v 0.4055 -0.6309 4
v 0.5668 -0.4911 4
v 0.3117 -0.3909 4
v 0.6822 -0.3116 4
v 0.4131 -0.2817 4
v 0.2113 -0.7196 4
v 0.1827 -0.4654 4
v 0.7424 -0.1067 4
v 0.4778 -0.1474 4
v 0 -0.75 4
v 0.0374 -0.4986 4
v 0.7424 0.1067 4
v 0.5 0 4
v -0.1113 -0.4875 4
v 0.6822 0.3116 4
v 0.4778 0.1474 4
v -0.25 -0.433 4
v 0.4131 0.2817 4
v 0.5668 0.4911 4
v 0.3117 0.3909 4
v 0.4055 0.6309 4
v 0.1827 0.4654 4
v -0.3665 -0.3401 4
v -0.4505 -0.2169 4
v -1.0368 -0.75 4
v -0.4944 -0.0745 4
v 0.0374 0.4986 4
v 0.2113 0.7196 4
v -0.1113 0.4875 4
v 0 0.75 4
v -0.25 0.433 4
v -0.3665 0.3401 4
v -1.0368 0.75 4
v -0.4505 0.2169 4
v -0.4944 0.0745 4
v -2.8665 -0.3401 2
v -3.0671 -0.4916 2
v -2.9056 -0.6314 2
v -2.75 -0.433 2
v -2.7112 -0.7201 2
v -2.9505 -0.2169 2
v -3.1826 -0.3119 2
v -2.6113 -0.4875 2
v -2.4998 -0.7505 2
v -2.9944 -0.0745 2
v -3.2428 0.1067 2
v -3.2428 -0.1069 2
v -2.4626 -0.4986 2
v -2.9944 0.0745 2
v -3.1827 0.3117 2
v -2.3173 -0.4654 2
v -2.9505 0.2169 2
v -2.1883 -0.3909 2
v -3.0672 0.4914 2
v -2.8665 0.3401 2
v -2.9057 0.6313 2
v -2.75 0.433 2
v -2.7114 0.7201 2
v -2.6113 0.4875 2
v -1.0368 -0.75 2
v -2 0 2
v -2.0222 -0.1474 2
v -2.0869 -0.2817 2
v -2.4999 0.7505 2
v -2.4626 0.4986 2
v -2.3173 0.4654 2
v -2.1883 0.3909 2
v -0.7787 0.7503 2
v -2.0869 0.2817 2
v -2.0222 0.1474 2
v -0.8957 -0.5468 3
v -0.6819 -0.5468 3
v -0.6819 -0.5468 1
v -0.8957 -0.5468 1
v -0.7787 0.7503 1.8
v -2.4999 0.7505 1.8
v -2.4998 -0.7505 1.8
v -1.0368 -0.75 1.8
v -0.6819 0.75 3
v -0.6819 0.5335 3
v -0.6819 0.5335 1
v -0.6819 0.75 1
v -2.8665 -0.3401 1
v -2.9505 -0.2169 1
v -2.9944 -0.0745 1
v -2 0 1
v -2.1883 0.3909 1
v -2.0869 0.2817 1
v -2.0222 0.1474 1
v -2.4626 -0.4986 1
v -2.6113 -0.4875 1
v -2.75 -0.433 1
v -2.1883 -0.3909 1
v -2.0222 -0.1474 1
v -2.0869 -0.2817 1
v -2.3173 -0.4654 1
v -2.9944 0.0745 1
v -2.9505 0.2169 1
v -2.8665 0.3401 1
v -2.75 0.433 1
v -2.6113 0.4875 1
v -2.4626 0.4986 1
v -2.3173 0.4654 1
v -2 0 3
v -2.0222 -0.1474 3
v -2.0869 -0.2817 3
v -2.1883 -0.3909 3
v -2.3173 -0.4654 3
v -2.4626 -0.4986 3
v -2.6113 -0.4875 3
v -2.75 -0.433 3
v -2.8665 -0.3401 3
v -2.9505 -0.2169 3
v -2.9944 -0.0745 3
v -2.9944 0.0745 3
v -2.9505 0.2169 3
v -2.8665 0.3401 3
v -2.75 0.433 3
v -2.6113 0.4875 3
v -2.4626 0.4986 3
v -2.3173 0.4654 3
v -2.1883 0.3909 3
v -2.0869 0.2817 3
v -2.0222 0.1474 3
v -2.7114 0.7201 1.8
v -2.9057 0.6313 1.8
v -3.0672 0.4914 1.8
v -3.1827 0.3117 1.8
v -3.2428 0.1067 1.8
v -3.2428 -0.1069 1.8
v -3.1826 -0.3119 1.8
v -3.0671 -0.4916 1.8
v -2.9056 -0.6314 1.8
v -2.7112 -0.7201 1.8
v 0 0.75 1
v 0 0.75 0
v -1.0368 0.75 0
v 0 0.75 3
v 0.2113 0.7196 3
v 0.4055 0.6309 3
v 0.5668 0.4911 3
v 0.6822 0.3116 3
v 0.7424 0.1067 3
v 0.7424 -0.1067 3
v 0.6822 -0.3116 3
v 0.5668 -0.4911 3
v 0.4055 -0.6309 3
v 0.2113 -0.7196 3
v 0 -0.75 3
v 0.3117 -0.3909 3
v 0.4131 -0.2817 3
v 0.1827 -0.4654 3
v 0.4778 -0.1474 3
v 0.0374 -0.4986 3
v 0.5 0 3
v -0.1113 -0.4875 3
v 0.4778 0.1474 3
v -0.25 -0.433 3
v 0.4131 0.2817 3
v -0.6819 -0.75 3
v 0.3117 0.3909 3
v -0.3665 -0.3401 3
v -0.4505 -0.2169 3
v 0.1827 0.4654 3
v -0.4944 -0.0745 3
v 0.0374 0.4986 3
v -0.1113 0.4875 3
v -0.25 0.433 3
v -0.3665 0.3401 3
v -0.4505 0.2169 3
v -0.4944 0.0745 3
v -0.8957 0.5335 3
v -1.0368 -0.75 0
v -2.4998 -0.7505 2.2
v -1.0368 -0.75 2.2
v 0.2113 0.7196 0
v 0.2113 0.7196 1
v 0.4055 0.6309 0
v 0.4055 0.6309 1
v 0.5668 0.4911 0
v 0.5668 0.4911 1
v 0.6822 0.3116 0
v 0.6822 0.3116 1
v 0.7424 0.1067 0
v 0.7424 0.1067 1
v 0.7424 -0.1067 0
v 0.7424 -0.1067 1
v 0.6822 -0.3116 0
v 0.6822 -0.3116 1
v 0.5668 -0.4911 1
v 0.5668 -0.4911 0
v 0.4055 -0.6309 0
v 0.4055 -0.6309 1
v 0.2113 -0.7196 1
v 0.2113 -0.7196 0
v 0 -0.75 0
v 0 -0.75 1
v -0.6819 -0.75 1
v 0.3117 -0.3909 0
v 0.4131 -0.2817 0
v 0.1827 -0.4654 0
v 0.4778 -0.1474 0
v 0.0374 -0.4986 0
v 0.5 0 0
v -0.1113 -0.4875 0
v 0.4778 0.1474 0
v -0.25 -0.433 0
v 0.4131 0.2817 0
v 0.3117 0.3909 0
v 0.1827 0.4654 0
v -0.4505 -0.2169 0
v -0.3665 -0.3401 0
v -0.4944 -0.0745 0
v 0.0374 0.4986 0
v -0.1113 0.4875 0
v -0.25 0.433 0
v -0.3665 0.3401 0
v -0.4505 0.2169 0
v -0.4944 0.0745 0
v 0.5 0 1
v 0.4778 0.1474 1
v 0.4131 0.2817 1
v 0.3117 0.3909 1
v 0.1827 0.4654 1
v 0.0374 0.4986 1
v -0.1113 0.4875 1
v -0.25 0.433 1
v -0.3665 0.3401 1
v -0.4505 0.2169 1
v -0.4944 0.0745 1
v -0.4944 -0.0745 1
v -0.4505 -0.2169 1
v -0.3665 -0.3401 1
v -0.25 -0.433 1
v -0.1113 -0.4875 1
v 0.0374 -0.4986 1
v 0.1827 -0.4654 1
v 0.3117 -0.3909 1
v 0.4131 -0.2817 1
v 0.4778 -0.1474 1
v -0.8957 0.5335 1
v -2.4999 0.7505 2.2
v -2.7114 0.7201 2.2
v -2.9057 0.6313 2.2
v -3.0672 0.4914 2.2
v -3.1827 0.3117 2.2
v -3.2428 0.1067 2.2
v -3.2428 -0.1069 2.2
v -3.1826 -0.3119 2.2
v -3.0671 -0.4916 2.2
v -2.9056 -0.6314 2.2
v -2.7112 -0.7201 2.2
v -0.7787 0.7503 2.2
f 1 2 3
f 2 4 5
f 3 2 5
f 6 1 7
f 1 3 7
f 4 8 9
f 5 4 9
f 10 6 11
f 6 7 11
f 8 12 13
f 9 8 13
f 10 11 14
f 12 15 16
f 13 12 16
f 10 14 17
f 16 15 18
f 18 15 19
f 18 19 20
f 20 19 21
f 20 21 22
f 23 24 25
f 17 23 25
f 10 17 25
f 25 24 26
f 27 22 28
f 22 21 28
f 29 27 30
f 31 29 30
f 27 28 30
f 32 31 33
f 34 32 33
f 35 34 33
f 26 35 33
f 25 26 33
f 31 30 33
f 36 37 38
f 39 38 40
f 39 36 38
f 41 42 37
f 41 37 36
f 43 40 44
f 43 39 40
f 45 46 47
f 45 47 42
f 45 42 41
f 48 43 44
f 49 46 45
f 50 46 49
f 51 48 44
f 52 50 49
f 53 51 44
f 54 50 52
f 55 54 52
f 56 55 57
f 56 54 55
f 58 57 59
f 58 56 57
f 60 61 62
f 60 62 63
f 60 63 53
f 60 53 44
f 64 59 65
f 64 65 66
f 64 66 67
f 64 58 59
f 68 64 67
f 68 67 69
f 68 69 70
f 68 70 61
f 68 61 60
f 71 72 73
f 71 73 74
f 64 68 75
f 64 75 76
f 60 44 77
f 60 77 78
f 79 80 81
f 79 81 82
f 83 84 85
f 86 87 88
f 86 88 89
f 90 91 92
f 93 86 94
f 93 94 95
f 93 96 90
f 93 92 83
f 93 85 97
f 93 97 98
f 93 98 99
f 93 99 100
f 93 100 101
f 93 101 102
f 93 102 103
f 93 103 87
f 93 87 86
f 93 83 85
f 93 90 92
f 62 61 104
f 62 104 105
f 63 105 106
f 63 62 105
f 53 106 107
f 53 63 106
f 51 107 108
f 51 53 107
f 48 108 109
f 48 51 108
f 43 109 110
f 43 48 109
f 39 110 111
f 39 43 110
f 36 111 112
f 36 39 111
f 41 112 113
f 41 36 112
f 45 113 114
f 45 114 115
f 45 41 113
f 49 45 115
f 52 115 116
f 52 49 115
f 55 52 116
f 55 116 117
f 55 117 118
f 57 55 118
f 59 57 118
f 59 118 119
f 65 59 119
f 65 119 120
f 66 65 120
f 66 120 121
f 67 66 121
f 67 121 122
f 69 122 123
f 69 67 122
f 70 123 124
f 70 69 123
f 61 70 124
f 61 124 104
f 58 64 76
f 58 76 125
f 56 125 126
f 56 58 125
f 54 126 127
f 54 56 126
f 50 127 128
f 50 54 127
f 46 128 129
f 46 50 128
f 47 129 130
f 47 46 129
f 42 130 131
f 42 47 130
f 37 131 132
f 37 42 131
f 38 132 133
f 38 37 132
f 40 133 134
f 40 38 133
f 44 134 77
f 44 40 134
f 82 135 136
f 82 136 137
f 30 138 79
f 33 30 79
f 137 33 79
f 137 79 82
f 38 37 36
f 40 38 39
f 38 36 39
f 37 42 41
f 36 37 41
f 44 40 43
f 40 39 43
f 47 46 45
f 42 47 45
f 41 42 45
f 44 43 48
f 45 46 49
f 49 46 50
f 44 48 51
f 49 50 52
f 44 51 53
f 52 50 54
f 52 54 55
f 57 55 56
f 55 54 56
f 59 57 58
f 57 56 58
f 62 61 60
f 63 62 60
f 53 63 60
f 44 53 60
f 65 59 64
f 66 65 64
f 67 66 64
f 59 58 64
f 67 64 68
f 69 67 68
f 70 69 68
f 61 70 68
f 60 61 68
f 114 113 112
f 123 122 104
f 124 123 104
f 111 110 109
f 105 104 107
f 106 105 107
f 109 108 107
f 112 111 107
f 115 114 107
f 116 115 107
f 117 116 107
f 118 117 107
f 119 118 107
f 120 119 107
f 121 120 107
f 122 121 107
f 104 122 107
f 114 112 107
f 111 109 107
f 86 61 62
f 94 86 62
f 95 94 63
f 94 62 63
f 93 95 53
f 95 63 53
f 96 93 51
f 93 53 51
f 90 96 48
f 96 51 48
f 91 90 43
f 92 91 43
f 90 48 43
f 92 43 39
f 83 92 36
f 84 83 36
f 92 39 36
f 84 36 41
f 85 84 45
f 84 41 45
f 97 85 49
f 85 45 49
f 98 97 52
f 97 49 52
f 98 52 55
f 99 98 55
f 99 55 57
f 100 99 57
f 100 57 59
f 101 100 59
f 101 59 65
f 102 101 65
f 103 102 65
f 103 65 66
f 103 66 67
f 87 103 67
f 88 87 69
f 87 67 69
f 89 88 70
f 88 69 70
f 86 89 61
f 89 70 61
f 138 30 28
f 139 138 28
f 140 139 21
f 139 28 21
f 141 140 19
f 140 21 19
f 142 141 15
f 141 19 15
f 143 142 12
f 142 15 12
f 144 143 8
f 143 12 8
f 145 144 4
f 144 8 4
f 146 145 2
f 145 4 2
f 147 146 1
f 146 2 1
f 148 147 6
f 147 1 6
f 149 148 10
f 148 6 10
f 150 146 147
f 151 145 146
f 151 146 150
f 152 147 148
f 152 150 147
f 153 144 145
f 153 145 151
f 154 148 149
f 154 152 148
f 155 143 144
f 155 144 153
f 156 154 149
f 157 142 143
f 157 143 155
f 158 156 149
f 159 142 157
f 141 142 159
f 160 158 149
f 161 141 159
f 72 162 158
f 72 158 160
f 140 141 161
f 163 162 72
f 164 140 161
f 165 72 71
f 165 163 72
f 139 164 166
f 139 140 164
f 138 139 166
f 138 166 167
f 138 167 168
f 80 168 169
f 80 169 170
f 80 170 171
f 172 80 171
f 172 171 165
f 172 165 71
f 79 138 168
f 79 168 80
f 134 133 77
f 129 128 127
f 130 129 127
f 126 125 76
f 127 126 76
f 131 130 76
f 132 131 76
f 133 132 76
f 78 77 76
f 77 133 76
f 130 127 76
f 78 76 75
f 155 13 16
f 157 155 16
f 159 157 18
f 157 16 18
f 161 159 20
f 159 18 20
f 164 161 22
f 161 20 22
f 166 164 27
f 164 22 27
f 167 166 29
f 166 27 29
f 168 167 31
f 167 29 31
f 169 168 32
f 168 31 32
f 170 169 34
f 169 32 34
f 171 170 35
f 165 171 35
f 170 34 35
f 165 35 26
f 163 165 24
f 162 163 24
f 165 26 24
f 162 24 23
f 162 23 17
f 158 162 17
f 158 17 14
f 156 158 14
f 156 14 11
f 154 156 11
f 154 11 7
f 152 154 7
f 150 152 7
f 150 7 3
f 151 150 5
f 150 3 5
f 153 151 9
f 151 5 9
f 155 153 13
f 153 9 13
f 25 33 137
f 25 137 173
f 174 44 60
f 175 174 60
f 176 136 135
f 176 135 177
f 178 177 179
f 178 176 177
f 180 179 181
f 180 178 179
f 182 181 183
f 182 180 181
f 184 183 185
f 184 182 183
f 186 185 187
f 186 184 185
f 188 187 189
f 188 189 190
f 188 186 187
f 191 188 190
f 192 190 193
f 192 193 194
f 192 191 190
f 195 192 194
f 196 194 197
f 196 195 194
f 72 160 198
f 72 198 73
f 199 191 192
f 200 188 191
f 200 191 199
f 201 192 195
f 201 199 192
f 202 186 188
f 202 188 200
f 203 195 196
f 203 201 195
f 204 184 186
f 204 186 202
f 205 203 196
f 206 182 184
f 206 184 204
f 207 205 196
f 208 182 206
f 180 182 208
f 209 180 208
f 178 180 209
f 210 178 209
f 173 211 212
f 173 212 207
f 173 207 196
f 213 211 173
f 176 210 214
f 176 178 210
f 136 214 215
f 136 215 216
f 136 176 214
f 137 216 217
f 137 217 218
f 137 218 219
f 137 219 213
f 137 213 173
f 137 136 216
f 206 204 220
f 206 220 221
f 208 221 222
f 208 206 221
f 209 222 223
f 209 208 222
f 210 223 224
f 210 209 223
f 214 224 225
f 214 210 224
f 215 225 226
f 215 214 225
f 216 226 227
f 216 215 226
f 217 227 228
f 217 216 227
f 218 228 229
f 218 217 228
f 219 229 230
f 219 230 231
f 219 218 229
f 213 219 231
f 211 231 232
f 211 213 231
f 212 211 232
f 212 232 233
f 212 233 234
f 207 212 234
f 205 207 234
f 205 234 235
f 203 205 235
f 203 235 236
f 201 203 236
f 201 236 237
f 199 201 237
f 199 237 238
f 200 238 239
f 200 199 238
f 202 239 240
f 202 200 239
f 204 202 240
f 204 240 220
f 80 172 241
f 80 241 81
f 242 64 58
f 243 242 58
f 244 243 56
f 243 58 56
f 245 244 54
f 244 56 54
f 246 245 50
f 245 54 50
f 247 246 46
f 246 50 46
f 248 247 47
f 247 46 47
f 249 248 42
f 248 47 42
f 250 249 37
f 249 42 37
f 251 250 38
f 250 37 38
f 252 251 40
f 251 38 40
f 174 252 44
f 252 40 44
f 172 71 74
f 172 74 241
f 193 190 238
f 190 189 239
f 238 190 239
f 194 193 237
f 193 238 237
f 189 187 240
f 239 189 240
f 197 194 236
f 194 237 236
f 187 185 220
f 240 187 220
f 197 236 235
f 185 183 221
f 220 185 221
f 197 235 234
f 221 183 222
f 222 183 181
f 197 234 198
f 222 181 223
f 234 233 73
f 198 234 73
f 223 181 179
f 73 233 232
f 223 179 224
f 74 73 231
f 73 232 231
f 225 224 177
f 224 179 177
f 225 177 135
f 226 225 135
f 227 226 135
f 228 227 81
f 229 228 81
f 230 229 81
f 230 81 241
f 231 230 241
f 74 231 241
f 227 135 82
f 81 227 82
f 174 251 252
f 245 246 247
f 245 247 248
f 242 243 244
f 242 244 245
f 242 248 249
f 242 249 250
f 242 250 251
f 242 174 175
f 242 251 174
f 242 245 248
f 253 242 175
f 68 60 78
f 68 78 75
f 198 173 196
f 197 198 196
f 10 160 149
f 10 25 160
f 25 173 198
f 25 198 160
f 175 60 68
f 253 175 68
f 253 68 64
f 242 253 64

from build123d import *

# Parameters (mm, degrees)
SKETCH1_R           = 0.5
BOSS_EXTRUDE1_DEPTH = 1
BOSS_EXTRUDE2_DEPTH = 1
BOSS_EXTRUDE4_DEPTH = 0.2
SKETCH5_R           = 0.5
BOSS_EXTRUDE5_DEPTH = 1


with BuildPart() as part:
    # Sketch1 → Boss-Extrude1 (new body)
    with BuildSketch(Plane.XY):
        with BuildLine():
            Line((-1.036772363, 0.75), (0, 0.75))
            ThreePointArc((0, 0.75), (0.75, 0), (0, -0.75))
            Line((0, -0.75), (-1.036772363, -0.75))
            Line((-1.036772363, -0.75), (-1.036772363, 0.75))
        make_face()
        Circle(SKETCH1_R, mode=Mode.SUBTRACT)
    extrude(amount=BOSS_EXTRUDE1_DEPTH)

    # Sketch2 → Boss-Extrude2 (add)
    with BuildSketch(Plane.XY.offset(1)):
        Polygon((-0.681856946, 0.75), (-1.036772363, 0.75), (-1.036772363, -0.75), (-0.681856946, -0.75), (-0.681856946, -0.546810509), (-0.895709018, -0.546810509), (-0.895709018, 0.533549045), (-0.681856946, 0.533549045), align=None)
    extrude(amount=BOSS_EXTRUDE2_DEPTH)

    # Mirror4: part across plane


with BuildPart() as part_1:
    add(part.part)
    add(part.part.mirror(Plane.XY.offset(2)))


with BuildPart() as body_2:
    # Sketch4 → Boss-Extrude4 (new body)
    with BuildSketch(Plane.XY.offset(2)):
        with BuildLine():
            Line((-0.778702826, 0.750312574), (-2.499930103, 0.750472884))
            ThreePointArc((-2.499930103, 0.750472884), (-3.250472883, -8.6331e-05), (-2.499757441, -0.750472849))
            Line((-2.499757441, -0.750472849), (-1.036772363, -0.75))
            Line((-1.036772363, -0.75), (-0.778702826, 0.750312574))
        make_face()
    extrude(amount=BOSS_EXTRUDE4_DEPTH)

    # Sketch5 → Boss-Extrude5 (add)
    with BuildSketch(Plane(origin=(0, 0, 2), x_dir=(-1, 0, 0), z_dir=(0, 0, -1))):
        with Locations((2.5, 0)):
            Circle(SKETCH5_R)
    extrude(amount=BOSS_EXTRUDE5_DEPTH)


with BuildPart() as body_3:
    # Mirror5: mirrored copy
    add(body_2.part.mirror(Plane.XY.offset(2)))


solid = Compound([part_1.part, body_2.part, body_3.part])
